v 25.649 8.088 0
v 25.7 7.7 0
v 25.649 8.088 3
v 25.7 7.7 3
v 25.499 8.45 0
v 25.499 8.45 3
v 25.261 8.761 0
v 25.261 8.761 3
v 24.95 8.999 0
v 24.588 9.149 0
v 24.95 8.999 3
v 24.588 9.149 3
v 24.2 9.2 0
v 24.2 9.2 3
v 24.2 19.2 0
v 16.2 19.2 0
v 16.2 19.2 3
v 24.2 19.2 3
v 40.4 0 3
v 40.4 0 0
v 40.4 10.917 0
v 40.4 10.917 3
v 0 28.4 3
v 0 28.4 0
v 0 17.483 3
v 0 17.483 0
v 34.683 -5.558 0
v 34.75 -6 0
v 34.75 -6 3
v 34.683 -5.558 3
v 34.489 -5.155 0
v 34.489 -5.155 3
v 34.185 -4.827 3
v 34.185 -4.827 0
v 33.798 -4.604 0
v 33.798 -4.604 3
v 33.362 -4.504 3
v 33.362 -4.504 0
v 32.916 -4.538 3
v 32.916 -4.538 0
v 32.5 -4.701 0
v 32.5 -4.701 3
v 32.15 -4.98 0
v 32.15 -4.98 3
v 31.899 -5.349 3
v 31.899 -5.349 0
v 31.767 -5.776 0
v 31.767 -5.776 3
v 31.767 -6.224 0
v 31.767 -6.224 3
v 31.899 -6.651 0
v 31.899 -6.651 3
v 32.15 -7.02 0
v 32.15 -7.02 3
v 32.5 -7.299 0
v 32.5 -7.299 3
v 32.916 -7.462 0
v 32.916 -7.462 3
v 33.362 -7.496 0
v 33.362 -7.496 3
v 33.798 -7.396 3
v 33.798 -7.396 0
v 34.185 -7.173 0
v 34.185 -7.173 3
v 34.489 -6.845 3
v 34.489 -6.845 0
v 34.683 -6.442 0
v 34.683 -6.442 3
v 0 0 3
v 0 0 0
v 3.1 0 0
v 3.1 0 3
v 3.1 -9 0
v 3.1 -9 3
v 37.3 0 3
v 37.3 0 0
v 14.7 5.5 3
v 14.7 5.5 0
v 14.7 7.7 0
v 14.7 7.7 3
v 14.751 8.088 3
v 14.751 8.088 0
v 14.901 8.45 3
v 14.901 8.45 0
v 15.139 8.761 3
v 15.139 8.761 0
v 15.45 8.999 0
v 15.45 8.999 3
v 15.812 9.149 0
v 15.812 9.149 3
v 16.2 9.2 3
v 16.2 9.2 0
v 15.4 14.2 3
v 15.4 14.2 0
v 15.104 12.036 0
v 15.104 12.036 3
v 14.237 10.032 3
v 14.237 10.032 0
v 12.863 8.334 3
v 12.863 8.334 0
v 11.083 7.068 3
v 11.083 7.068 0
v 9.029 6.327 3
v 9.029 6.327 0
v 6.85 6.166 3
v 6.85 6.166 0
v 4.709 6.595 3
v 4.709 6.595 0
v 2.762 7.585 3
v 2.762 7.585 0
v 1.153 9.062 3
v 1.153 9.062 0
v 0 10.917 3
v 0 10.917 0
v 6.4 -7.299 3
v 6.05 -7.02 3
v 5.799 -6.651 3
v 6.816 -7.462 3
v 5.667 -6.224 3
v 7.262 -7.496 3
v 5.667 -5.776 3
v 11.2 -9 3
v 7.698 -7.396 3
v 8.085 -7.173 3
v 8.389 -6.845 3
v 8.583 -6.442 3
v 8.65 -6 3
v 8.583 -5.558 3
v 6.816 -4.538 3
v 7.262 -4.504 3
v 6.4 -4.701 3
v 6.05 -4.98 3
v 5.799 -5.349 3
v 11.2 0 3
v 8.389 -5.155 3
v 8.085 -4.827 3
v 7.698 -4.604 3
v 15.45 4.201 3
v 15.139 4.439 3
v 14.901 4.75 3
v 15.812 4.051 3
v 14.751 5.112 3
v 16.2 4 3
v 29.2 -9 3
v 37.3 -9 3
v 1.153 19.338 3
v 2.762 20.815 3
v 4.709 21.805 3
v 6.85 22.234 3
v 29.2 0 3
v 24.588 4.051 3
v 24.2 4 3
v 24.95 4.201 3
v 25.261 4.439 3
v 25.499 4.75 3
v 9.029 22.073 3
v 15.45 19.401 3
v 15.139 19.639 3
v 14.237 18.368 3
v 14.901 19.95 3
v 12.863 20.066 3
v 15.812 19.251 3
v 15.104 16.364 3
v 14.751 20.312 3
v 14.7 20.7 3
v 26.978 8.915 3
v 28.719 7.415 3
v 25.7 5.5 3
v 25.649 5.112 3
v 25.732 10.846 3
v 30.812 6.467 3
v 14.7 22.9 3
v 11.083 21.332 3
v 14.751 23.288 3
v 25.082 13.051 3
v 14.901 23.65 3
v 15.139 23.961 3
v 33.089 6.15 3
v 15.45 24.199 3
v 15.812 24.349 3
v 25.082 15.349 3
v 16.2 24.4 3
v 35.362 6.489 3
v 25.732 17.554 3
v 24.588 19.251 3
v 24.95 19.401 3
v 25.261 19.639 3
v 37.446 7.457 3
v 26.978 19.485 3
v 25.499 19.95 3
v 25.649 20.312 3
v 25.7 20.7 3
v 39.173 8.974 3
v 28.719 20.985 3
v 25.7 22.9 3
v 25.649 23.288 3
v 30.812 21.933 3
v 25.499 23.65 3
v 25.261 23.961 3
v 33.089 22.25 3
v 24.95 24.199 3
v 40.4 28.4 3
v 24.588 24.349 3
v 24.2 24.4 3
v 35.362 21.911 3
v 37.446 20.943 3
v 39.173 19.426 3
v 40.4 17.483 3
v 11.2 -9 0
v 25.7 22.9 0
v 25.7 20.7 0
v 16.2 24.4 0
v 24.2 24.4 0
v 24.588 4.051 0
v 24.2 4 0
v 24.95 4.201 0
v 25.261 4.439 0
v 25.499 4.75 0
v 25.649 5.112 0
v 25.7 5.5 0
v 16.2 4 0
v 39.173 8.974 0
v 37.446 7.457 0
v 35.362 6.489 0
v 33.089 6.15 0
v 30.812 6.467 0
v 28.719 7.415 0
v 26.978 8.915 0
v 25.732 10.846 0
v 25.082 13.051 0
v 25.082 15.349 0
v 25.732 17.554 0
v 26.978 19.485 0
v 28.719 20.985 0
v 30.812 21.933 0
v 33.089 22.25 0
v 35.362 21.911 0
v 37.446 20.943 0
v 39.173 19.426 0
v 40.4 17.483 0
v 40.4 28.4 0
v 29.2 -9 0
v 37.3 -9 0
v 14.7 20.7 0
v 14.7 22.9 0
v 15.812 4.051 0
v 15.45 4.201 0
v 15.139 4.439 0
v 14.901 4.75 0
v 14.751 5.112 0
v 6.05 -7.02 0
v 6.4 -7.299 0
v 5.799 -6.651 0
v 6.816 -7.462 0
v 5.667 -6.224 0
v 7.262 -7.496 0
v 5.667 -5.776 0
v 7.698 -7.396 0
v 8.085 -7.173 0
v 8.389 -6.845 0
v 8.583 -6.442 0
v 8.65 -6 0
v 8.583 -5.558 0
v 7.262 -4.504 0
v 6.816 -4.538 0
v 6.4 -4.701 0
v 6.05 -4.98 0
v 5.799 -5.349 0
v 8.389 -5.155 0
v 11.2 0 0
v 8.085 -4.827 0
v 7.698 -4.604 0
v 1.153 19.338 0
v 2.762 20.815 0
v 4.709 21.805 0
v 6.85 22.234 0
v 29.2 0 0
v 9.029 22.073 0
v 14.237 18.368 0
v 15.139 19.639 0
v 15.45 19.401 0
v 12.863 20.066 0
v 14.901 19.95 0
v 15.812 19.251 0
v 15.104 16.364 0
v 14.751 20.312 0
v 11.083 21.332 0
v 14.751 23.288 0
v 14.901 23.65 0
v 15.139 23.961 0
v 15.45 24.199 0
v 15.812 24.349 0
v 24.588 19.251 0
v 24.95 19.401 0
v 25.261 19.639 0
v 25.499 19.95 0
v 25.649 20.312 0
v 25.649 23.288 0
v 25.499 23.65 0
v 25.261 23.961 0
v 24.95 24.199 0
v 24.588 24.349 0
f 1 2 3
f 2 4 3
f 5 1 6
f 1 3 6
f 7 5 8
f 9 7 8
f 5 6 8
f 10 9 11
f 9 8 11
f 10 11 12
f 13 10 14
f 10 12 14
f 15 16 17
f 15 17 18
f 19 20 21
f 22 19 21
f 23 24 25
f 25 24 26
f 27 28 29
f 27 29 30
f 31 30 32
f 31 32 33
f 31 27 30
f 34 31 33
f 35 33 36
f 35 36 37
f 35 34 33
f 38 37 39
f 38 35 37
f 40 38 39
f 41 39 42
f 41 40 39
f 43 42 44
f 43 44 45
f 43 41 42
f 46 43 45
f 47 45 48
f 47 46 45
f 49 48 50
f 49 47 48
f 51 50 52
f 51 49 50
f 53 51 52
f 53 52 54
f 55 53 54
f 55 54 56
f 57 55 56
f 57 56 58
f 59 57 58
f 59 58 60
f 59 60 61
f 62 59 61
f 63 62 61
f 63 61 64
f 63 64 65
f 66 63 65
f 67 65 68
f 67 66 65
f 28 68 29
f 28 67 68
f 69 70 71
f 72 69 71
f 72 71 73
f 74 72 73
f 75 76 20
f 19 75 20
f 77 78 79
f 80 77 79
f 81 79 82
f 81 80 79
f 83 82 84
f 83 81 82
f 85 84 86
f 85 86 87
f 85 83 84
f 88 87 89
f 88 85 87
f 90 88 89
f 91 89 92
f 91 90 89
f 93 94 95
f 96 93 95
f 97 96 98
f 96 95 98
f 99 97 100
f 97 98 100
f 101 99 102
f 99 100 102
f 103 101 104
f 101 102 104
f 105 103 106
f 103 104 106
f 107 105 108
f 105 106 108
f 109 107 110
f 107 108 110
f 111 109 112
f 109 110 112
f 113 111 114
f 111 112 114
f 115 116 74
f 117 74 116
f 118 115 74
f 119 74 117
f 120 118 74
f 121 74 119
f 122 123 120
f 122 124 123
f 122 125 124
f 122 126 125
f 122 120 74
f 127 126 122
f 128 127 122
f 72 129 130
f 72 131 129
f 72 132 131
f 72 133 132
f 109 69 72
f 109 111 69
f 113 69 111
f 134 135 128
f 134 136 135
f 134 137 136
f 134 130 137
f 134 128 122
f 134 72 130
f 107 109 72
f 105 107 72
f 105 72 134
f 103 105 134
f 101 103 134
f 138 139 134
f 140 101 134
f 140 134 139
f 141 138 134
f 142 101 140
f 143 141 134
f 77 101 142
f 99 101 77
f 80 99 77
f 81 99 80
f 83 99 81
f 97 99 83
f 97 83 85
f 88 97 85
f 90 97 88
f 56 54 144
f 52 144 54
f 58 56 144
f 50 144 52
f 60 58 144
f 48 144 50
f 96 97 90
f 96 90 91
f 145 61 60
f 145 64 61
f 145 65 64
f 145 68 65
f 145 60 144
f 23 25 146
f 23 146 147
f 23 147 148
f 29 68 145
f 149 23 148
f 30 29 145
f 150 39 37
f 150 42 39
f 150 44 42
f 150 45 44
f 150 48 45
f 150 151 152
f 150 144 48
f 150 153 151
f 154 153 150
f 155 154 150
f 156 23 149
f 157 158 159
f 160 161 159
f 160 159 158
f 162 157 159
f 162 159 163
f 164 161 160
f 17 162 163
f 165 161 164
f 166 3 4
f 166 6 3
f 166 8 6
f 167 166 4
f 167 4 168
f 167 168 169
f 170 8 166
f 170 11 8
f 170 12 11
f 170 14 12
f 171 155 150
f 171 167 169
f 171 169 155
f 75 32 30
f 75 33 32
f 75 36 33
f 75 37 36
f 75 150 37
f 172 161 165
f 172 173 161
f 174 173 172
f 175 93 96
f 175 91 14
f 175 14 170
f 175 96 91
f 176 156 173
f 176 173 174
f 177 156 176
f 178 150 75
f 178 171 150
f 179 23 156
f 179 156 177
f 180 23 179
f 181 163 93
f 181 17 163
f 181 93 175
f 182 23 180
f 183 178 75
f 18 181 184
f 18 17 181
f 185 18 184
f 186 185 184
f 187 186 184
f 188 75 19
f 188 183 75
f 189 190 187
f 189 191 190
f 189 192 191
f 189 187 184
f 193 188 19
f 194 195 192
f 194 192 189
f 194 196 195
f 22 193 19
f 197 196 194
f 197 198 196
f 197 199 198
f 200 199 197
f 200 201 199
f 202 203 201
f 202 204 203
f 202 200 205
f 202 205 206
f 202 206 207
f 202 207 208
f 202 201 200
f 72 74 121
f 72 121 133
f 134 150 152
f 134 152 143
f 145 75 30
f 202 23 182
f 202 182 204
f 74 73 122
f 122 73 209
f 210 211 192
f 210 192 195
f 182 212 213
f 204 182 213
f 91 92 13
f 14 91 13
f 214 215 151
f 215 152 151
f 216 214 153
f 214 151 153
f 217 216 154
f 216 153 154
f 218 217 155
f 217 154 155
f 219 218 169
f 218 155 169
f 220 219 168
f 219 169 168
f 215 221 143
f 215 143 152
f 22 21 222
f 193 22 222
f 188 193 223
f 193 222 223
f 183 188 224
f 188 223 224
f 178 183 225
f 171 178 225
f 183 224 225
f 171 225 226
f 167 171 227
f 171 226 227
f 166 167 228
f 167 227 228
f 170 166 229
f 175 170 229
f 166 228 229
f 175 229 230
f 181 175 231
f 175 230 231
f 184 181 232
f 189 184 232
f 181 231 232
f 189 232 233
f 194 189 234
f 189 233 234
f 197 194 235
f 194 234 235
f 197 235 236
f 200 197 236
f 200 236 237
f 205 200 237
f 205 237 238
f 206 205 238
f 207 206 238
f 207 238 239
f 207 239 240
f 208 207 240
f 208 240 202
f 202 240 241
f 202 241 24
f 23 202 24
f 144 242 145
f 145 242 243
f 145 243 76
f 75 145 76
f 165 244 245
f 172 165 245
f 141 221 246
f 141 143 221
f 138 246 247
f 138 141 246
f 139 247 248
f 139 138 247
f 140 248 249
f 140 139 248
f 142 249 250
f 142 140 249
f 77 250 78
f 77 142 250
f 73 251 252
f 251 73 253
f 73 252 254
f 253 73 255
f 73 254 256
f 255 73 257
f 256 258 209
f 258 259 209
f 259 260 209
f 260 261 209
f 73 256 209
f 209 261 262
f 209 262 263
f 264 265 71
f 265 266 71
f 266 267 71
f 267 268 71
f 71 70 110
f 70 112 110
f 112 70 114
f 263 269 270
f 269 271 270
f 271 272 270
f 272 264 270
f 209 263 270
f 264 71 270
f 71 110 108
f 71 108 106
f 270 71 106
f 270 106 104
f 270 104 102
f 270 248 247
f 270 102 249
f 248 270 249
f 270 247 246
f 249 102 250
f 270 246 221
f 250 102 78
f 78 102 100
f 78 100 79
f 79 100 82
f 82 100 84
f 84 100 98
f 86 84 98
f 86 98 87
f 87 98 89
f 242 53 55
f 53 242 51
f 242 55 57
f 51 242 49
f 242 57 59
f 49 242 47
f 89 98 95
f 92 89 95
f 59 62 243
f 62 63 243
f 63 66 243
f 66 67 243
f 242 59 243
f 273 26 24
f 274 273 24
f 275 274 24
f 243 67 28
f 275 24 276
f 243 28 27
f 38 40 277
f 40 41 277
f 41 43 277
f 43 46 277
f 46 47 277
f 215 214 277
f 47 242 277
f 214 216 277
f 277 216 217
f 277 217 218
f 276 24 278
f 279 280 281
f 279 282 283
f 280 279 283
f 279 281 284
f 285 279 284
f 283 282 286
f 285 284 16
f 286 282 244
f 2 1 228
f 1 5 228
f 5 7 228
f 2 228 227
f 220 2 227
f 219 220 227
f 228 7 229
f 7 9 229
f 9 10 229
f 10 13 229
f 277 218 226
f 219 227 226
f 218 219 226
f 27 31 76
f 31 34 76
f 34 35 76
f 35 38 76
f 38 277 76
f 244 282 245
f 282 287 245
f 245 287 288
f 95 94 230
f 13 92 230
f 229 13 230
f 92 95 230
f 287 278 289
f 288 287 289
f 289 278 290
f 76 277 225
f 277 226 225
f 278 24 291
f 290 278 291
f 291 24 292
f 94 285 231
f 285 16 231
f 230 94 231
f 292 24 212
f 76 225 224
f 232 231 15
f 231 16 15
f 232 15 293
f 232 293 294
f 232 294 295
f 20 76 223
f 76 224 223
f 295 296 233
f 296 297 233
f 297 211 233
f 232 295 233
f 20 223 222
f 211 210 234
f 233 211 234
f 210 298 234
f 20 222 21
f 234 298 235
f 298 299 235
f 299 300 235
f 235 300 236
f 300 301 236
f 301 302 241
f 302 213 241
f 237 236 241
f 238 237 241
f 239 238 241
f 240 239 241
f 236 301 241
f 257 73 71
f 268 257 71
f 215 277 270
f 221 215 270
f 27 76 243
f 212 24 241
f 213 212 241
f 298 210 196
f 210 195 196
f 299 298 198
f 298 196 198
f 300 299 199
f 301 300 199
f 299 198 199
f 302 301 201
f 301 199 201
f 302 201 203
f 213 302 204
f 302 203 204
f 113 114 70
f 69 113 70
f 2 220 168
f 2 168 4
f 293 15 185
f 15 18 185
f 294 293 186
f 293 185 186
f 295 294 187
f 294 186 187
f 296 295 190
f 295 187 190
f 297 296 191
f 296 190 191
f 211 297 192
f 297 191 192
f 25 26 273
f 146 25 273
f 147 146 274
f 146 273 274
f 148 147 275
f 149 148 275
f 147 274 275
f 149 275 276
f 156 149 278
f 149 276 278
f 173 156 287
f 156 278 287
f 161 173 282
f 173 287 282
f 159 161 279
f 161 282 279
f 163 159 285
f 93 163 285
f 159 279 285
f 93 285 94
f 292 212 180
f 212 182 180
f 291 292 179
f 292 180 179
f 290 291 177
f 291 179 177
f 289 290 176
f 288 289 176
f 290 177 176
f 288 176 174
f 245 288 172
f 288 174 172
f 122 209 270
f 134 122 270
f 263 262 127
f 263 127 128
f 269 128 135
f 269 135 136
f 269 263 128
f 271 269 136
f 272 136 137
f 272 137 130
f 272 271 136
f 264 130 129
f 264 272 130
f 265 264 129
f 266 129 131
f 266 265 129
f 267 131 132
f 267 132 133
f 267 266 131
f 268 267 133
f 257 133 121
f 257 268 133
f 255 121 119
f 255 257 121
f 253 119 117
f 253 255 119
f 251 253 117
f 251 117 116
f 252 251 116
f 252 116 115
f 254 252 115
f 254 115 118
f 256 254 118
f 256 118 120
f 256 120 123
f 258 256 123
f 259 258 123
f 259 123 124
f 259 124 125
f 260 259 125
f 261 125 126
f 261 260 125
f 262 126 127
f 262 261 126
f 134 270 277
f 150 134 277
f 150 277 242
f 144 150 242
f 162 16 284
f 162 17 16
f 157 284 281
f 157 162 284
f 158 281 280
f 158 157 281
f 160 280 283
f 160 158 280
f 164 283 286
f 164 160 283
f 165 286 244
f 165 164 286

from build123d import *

# Parameters (mm, degrees)
ESBO_O1_R                = 1.5
ESBO_O1_W                = 11
ESBO_O1_H                = 5.2
RESSALTO_EXTRUS_O1_DEPTH = 3
FILETE1_R                = 1.5
FILETE2_R                = 1.5


with BuildPart() as part:
    # Esboço1 → Ressalto-extrusão1 (new body)
    with BuildSketch(Plane.XY):
        with BuildLine():
            Line((0, 10.916708968), (0, 0))
            Line((0, 0), (3.1, 0))
            Line((3.1, 0), (3.1, -9))
            Line((3.1, -9), (11.2, -9))
            Line((11.2, -9), (11.2, 0))
            Line((11.2, 0), (29.2, 0))
            Line((29.2, 0), (29.2, -9))
            Line((29.2, -9), (37.3, -9))
            Line((37.3, -9), (37.3, 0))
            Line((37.3, 0), (40.4, 0))
            Line((40.4, 0), (40.4, 10.916708968))
            ThreePointArc((40.4, 10.916708968), (25, 14.2), (40.4, 17.483291032))
            Line((40.4, 17.483291032), (40.4, 28.4))
            Line((40.4, 28.4), (0, 28.4))
            Line((0, 28.4), (0, 17.483291032))
            ThreePointArc((0, 17.483291032), (9.028541033, 22.073055315), (15.4, 14.2))
            ThreePointArc((15.4, 14.2), (9.028541033, 6.326944685), (0, 10.916708968))
        make_face()
        with Locations((7.15, -6)):
            Circle(ESBO_O1_R, mode=Mode.SUBTRACT)
        with Locations((20.2, 6.6)):
            Rectangle(ESBO_O1_W, ESBO_O1_H, mode=Mode.SUBTRACT)
        with Locations((33.25, -6)):
            Circle(ESBO_O1_R, mode=Mode.SUBTRACT)
        with Locations((20.2, 21.8)):
            Rectangle(ESBO_O1_W, ESBO_O1_H, mode=Mode.SUBTRACT)
    extrude(amount=RESSALTO_EXTRUS_O1_DEPTH)

    # Filete1
    filete1_edges = [part.edges().sort_by_distance(p)[0] for p in [
        (14.7, 24.4, 1.5),
        (14.7, 19.2, 1.5),
        (25.7, 19.2, 1.5),
        (25.7, 24.4, 1.5),
    ]]
    fillet(filete1_edges, radius=FILETE1_R)

    # Filete2
    filete2_edges = [part.edges().sort_by_distance(p)[0] for p in [
        (25.7, 9.2, 1.5),
        (14.7, 9.2, 1.5),
        (14.7, 4, 1.5),
        (25.7, 4, 1.5),
    ]]
    fillet(filete2_edges, radius=FILETE2_R)


solid = part.part
